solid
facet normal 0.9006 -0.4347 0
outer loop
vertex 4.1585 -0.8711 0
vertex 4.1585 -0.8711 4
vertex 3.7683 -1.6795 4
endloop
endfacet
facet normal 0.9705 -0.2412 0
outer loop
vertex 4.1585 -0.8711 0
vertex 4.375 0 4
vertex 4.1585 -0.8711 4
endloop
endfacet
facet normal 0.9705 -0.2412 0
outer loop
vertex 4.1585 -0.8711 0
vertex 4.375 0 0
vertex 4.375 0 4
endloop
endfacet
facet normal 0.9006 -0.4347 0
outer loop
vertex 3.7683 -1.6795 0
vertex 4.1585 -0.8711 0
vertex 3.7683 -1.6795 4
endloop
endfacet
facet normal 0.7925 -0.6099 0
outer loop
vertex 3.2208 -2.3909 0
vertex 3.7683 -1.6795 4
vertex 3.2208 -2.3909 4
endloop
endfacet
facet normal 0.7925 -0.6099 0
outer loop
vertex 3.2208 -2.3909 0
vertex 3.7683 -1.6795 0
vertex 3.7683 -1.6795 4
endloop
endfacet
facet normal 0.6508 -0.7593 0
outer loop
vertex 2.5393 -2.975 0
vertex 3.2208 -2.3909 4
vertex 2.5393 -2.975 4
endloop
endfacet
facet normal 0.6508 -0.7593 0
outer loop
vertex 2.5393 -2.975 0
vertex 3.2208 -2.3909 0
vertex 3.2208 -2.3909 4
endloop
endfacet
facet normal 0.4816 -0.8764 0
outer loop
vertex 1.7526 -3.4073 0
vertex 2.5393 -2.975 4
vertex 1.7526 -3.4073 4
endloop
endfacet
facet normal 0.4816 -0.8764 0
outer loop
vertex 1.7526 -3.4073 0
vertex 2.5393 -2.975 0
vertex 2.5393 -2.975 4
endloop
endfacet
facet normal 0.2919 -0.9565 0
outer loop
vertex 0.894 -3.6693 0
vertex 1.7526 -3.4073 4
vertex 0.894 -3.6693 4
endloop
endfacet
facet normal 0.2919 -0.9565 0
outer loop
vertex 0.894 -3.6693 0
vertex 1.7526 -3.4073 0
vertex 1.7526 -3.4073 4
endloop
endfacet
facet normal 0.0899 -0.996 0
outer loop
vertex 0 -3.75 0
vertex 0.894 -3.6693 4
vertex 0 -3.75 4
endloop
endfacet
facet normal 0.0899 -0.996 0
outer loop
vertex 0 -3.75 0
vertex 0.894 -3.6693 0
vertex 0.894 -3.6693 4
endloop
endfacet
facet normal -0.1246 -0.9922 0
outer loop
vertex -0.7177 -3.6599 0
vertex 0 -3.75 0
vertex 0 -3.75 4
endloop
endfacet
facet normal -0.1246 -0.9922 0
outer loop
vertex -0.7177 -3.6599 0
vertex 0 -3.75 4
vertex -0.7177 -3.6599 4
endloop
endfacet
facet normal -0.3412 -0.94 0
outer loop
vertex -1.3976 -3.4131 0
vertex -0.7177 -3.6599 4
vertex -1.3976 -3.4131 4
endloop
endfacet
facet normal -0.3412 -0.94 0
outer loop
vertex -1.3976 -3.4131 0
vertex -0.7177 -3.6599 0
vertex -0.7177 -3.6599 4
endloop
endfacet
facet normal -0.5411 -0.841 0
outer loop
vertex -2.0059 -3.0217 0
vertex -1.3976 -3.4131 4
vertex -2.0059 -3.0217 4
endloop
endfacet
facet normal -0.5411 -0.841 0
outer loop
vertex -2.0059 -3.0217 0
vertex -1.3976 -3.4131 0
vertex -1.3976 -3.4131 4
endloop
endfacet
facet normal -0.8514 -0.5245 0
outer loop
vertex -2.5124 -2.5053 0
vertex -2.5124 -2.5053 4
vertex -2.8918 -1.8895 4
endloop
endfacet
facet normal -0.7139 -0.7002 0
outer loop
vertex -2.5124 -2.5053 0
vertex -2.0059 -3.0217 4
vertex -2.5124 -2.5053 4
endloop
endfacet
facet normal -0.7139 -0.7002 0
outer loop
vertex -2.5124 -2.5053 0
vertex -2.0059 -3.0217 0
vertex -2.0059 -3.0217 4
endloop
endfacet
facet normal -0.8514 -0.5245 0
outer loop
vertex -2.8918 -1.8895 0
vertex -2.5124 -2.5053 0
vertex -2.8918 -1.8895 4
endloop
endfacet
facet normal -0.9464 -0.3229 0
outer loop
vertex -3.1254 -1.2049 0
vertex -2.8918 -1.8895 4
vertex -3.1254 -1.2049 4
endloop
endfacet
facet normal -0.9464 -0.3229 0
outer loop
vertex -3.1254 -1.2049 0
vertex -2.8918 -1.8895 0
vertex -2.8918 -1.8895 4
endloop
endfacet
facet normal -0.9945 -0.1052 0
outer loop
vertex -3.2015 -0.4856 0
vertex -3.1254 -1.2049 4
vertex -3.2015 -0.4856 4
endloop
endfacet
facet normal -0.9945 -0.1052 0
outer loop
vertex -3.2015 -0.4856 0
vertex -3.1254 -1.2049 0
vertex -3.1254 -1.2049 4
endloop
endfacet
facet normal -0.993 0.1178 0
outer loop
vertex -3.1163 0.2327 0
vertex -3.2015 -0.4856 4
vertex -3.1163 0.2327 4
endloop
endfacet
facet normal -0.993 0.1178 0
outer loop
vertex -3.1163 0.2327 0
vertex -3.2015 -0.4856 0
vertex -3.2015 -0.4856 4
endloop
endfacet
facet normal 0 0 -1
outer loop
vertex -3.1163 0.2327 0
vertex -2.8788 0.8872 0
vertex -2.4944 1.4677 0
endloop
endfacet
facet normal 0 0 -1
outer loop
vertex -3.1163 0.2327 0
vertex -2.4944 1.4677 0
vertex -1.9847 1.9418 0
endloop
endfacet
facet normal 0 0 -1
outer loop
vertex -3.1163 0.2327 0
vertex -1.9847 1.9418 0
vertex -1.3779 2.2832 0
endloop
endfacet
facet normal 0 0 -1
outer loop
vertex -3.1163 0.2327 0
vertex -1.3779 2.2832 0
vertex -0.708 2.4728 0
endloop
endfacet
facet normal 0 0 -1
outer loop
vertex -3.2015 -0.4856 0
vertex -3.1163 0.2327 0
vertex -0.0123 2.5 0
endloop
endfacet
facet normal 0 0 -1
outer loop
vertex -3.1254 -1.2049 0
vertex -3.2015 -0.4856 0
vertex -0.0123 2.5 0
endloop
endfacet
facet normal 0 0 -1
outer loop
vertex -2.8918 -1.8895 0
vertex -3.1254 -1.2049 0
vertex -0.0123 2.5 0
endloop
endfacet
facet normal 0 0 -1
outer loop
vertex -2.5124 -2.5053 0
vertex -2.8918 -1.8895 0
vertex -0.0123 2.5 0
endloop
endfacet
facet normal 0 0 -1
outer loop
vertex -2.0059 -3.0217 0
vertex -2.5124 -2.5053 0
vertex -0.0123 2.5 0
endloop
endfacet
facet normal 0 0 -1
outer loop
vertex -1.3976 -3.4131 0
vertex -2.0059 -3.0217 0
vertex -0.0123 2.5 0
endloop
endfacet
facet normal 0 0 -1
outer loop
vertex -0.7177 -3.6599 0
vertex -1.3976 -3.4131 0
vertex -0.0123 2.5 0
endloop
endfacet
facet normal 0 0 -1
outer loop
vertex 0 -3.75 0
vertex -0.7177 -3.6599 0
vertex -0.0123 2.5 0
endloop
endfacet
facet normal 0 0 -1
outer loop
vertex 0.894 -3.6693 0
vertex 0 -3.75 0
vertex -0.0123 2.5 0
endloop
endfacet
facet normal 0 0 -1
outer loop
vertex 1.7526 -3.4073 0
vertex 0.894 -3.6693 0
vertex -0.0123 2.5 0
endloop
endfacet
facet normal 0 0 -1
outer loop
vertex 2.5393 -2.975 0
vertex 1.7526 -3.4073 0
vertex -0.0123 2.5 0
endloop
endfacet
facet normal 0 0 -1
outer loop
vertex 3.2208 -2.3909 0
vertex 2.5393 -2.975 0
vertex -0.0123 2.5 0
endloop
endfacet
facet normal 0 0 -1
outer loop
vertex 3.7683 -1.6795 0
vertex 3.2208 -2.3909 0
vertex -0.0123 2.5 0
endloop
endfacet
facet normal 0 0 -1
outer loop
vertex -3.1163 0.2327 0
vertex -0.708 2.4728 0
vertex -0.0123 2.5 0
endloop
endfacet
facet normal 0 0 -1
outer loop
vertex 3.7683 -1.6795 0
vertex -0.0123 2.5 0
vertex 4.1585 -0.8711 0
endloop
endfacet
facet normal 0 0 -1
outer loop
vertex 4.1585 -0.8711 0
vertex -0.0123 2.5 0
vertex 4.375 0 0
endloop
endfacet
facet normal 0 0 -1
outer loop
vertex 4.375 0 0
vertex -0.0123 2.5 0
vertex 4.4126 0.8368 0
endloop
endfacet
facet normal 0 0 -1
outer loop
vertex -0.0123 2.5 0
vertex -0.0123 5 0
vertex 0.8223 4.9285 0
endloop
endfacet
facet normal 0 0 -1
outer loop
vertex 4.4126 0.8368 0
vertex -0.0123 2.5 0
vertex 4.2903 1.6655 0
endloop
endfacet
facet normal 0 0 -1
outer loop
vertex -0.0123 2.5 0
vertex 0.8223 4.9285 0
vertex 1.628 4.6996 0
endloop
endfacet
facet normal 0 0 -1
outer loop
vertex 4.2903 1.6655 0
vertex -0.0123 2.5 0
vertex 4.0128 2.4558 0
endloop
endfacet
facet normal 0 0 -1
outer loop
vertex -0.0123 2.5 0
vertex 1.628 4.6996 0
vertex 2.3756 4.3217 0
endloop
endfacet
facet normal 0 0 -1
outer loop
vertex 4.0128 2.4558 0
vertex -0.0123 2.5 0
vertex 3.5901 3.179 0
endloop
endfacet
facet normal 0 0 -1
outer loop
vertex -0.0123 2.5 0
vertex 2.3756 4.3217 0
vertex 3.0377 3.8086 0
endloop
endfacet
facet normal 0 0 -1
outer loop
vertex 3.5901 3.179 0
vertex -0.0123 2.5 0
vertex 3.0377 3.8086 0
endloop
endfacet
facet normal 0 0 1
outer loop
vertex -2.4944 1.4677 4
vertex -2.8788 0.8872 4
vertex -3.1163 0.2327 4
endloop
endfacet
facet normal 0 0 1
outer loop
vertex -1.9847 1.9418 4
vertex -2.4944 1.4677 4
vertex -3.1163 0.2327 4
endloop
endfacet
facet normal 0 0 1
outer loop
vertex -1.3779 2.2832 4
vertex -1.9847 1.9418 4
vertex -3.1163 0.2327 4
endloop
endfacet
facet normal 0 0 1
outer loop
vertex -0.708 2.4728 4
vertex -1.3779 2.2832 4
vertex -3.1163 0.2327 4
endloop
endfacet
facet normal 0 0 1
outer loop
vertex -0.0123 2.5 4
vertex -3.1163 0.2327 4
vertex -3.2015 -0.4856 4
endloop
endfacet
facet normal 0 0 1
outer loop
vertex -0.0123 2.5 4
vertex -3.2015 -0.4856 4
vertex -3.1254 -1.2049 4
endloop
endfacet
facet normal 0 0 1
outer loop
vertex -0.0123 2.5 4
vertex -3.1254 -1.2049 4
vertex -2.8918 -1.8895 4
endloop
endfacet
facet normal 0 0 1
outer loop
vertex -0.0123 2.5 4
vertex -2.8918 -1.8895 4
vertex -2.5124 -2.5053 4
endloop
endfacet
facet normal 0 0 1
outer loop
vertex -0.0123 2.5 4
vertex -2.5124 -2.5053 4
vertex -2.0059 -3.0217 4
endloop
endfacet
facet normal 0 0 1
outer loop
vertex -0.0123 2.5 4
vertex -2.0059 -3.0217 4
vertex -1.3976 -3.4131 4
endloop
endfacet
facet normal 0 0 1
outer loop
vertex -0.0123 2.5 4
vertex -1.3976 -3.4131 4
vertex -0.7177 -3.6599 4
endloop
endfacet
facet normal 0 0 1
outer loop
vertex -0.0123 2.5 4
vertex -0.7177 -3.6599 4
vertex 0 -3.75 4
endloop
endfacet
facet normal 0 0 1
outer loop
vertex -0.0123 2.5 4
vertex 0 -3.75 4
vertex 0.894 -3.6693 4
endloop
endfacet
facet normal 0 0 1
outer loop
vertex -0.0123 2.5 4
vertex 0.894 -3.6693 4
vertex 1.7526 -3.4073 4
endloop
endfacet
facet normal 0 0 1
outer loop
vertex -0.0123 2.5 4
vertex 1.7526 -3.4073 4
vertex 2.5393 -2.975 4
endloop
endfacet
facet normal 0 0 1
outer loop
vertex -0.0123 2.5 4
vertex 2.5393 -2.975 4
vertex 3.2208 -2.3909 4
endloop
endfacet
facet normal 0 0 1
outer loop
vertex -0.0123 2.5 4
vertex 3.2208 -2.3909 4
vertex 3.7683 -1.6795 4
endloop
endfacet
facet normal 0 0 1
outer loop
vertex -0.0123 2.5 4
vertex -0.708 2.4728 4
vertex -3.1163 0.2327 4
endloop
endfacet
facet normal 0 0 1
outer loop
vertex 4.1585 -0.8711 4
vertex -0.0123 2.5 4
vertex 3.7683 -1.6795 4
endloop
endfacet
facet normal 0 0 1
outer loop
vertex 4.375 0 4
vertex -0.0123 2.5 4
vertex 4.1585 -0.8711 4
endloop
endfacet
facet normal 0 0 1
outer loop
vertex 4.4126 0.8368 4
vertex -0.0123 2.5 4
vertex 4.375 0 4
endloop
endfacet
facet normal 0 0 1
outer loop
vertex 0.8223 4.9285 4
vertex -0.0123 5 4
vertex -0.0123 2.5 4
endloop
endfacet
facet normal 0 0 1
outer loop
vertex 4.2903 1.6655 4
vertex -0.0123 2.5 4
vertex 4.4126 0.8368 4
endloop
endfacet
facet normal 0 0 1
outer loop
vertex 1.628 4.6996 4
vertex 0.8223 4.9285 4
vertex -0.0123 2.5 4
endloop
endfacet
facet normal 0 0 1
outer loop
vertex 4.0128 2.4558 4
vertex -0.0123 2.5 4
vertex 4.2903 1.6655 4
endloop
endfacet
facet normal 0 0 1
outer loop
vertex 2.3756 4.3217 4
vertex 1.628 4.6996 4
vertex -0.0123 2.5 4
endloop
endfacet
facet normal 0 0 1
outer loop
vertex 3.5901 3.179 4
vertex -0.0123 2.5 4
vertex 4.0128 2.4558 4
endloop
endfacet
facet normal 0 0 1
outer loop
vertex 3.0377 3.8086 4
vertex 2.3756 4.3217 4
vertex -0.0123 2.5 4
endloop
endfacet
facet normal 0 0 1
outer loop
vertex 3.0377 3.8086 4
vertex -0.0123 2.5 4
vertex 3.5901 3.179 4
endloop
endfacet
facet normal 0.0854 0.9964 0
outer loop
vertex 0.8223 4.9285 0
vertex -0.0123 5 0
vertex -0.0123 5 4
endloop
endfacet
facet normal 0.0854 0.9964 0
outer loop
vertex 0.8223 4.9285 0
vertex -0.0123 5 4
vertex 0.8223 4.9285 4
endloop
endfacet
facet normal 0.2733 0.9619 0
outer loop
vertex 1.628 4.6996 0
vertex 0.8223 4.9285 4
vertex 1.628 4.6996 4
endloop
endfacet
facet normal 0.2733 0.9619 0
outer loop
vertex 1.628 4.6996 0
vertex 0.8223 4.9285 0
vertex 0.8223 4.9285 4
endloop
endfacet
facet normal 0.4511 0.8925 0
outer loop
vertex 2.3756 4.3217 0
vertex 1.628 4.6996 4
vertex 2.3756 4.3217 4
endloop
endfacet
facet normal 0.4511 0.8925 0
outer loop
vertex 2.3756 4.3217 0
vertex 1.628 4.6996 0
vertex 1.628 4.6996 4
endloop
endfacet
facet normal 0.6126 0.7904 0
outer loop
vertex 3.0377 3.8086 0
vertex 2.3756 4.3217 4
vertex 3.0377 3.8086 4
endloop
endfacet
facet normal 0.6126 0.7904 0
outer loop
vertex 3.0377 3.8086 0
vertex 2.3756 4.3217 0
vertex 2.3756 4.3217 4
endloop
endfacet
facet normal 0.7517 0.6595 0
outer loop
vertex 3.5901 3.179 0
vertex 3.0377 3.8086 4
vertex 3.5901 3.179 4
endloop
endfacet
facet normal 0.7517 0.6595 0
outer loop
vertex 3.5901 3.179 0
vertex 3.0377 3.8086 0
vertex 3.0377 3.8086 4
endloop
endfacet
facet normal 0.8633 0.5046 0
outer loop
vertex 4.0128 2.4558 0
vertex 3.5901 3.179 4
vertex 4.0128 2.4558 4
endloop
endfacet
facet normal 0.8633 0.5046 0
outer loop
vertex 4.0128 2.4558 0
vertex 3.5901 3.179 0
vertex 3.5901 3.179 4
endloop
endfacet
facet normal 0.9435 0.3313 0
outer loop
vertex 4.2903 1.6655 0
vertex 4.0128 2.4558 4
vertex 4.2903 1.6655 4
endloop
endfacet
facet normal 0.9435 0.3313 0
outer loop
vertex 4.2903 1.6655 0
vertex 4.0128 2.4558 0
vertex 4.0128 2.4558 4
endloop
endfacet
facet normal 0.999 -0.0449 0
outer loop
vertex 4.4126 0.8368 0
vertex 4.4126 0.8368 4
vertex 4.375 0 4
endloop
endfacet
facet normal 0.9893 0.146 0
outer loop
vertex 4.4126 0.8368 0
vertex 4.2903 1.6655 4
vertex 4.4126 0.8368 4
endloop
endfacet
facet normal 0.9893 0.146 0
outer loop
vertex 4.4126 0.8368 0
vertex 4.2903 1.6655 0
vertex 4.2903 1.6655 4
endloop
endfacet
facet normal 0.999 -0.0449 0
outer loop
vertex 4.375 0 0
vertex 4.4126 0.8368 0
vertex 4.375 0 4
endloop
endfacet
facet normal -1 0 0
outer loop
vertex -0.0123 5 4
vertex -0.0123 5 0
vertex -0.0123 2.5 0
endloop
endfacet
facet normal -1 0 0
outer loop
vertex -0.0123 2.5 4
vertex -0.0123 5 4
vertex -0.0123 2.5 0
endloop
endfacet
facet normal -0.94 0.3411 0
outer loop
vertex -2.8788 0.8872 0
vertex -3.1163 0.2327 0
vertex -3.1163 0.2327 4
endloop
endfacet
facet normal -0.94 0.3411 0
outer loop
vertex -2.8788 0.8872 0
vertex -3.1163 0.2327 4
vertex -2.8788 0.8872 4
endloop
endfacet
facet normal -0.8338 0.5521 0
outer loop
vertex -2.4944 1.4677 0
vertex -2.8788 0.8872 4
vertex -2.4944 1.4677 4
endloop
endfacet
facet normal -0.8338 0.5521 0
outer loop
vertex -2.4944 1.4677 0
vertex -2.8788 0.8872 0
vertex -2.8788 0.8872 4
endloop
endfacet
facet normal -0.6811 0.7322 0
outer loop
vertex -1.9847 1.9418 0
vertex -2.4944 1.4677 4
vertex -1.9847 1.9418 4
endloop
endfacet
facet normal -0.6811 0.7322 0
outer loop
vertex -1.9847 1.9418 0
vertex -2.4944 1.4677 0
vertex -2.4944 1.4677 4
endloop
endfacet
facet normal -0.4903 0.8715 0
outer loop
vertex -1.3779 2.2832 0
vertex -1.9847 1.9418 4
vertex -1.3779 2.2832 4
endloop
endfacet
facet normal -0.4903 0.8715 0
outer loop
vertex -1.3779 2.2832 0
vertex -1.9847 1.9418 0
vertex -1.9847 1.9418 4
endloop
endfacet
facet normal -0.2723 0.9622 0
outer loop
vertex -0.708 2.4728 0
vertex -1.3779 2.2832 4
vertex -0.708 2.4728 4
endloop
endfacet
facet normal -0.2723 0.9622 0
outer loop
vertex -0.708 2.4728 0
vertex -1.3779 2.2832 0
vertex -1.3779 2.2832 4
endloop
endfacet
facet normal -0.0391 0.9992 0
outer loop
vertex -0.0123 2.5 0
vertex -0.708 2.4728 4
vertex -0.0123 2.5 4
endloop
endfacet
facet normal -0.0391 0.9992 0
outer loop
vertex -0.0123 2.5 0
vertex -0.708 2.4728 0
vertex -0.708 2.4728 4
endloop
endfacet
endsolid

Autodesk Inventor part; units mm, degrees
ref_plane "YZ Plane" through (0, 0, 0) normal (1, 0, 0) x (0, 1, 0)
ref_plane "XZ Plane" through (0, 0, 0) normal (0, 1, 0) x (-1, 0, 0)
ref_plane "XY Plane" through (0, 0, 0) normal (0, 0, 1) x (1, 0, 0)
sketch "Sketch2" plane through (0, 0, 0) normal (0, 0, 1) x (1, 0, 0)
  circle A0 centre (0, 0) radius 5 construction
  circle A1 centre (0, 0) radius 2.5 construction
  circle A2 centre (0, 0) radius 3.125 construction
  circle A3 centre (0, 0) radius 3.75 construction
  circle A4 centre (0, 0) radius 4.375 construction
  arc A5 (4.375, 0) -> (-0.0123, 5) centre (0.032, 0.6141) ccw
  arc A6 (0, -3.75) -> (4.375, 0) centre (0.0571, 0.6105) ccw
  arc A7 (-3.1163, 0.2327) -> (0, -3.75) centre (0.0424, -0.5062) ccw
  arc A8 (-0.0123, 2.5) -> (-3.1163, 0.2327) centre (-0.2458, -0.4388) ccw
  line L0 (-0.0123, 5) -> (-0.0123, 2.5)
  dimension "d6" = 5
  dimension "d7" = 2.5
  dimension "d9" = 0.625
  dimension "d10" = 1.25
  dimension "d11" = 1.875
extrude "Extrusion1" add sketch "Sketch2" along normal blind 4
properties part number "Snail Cam"
